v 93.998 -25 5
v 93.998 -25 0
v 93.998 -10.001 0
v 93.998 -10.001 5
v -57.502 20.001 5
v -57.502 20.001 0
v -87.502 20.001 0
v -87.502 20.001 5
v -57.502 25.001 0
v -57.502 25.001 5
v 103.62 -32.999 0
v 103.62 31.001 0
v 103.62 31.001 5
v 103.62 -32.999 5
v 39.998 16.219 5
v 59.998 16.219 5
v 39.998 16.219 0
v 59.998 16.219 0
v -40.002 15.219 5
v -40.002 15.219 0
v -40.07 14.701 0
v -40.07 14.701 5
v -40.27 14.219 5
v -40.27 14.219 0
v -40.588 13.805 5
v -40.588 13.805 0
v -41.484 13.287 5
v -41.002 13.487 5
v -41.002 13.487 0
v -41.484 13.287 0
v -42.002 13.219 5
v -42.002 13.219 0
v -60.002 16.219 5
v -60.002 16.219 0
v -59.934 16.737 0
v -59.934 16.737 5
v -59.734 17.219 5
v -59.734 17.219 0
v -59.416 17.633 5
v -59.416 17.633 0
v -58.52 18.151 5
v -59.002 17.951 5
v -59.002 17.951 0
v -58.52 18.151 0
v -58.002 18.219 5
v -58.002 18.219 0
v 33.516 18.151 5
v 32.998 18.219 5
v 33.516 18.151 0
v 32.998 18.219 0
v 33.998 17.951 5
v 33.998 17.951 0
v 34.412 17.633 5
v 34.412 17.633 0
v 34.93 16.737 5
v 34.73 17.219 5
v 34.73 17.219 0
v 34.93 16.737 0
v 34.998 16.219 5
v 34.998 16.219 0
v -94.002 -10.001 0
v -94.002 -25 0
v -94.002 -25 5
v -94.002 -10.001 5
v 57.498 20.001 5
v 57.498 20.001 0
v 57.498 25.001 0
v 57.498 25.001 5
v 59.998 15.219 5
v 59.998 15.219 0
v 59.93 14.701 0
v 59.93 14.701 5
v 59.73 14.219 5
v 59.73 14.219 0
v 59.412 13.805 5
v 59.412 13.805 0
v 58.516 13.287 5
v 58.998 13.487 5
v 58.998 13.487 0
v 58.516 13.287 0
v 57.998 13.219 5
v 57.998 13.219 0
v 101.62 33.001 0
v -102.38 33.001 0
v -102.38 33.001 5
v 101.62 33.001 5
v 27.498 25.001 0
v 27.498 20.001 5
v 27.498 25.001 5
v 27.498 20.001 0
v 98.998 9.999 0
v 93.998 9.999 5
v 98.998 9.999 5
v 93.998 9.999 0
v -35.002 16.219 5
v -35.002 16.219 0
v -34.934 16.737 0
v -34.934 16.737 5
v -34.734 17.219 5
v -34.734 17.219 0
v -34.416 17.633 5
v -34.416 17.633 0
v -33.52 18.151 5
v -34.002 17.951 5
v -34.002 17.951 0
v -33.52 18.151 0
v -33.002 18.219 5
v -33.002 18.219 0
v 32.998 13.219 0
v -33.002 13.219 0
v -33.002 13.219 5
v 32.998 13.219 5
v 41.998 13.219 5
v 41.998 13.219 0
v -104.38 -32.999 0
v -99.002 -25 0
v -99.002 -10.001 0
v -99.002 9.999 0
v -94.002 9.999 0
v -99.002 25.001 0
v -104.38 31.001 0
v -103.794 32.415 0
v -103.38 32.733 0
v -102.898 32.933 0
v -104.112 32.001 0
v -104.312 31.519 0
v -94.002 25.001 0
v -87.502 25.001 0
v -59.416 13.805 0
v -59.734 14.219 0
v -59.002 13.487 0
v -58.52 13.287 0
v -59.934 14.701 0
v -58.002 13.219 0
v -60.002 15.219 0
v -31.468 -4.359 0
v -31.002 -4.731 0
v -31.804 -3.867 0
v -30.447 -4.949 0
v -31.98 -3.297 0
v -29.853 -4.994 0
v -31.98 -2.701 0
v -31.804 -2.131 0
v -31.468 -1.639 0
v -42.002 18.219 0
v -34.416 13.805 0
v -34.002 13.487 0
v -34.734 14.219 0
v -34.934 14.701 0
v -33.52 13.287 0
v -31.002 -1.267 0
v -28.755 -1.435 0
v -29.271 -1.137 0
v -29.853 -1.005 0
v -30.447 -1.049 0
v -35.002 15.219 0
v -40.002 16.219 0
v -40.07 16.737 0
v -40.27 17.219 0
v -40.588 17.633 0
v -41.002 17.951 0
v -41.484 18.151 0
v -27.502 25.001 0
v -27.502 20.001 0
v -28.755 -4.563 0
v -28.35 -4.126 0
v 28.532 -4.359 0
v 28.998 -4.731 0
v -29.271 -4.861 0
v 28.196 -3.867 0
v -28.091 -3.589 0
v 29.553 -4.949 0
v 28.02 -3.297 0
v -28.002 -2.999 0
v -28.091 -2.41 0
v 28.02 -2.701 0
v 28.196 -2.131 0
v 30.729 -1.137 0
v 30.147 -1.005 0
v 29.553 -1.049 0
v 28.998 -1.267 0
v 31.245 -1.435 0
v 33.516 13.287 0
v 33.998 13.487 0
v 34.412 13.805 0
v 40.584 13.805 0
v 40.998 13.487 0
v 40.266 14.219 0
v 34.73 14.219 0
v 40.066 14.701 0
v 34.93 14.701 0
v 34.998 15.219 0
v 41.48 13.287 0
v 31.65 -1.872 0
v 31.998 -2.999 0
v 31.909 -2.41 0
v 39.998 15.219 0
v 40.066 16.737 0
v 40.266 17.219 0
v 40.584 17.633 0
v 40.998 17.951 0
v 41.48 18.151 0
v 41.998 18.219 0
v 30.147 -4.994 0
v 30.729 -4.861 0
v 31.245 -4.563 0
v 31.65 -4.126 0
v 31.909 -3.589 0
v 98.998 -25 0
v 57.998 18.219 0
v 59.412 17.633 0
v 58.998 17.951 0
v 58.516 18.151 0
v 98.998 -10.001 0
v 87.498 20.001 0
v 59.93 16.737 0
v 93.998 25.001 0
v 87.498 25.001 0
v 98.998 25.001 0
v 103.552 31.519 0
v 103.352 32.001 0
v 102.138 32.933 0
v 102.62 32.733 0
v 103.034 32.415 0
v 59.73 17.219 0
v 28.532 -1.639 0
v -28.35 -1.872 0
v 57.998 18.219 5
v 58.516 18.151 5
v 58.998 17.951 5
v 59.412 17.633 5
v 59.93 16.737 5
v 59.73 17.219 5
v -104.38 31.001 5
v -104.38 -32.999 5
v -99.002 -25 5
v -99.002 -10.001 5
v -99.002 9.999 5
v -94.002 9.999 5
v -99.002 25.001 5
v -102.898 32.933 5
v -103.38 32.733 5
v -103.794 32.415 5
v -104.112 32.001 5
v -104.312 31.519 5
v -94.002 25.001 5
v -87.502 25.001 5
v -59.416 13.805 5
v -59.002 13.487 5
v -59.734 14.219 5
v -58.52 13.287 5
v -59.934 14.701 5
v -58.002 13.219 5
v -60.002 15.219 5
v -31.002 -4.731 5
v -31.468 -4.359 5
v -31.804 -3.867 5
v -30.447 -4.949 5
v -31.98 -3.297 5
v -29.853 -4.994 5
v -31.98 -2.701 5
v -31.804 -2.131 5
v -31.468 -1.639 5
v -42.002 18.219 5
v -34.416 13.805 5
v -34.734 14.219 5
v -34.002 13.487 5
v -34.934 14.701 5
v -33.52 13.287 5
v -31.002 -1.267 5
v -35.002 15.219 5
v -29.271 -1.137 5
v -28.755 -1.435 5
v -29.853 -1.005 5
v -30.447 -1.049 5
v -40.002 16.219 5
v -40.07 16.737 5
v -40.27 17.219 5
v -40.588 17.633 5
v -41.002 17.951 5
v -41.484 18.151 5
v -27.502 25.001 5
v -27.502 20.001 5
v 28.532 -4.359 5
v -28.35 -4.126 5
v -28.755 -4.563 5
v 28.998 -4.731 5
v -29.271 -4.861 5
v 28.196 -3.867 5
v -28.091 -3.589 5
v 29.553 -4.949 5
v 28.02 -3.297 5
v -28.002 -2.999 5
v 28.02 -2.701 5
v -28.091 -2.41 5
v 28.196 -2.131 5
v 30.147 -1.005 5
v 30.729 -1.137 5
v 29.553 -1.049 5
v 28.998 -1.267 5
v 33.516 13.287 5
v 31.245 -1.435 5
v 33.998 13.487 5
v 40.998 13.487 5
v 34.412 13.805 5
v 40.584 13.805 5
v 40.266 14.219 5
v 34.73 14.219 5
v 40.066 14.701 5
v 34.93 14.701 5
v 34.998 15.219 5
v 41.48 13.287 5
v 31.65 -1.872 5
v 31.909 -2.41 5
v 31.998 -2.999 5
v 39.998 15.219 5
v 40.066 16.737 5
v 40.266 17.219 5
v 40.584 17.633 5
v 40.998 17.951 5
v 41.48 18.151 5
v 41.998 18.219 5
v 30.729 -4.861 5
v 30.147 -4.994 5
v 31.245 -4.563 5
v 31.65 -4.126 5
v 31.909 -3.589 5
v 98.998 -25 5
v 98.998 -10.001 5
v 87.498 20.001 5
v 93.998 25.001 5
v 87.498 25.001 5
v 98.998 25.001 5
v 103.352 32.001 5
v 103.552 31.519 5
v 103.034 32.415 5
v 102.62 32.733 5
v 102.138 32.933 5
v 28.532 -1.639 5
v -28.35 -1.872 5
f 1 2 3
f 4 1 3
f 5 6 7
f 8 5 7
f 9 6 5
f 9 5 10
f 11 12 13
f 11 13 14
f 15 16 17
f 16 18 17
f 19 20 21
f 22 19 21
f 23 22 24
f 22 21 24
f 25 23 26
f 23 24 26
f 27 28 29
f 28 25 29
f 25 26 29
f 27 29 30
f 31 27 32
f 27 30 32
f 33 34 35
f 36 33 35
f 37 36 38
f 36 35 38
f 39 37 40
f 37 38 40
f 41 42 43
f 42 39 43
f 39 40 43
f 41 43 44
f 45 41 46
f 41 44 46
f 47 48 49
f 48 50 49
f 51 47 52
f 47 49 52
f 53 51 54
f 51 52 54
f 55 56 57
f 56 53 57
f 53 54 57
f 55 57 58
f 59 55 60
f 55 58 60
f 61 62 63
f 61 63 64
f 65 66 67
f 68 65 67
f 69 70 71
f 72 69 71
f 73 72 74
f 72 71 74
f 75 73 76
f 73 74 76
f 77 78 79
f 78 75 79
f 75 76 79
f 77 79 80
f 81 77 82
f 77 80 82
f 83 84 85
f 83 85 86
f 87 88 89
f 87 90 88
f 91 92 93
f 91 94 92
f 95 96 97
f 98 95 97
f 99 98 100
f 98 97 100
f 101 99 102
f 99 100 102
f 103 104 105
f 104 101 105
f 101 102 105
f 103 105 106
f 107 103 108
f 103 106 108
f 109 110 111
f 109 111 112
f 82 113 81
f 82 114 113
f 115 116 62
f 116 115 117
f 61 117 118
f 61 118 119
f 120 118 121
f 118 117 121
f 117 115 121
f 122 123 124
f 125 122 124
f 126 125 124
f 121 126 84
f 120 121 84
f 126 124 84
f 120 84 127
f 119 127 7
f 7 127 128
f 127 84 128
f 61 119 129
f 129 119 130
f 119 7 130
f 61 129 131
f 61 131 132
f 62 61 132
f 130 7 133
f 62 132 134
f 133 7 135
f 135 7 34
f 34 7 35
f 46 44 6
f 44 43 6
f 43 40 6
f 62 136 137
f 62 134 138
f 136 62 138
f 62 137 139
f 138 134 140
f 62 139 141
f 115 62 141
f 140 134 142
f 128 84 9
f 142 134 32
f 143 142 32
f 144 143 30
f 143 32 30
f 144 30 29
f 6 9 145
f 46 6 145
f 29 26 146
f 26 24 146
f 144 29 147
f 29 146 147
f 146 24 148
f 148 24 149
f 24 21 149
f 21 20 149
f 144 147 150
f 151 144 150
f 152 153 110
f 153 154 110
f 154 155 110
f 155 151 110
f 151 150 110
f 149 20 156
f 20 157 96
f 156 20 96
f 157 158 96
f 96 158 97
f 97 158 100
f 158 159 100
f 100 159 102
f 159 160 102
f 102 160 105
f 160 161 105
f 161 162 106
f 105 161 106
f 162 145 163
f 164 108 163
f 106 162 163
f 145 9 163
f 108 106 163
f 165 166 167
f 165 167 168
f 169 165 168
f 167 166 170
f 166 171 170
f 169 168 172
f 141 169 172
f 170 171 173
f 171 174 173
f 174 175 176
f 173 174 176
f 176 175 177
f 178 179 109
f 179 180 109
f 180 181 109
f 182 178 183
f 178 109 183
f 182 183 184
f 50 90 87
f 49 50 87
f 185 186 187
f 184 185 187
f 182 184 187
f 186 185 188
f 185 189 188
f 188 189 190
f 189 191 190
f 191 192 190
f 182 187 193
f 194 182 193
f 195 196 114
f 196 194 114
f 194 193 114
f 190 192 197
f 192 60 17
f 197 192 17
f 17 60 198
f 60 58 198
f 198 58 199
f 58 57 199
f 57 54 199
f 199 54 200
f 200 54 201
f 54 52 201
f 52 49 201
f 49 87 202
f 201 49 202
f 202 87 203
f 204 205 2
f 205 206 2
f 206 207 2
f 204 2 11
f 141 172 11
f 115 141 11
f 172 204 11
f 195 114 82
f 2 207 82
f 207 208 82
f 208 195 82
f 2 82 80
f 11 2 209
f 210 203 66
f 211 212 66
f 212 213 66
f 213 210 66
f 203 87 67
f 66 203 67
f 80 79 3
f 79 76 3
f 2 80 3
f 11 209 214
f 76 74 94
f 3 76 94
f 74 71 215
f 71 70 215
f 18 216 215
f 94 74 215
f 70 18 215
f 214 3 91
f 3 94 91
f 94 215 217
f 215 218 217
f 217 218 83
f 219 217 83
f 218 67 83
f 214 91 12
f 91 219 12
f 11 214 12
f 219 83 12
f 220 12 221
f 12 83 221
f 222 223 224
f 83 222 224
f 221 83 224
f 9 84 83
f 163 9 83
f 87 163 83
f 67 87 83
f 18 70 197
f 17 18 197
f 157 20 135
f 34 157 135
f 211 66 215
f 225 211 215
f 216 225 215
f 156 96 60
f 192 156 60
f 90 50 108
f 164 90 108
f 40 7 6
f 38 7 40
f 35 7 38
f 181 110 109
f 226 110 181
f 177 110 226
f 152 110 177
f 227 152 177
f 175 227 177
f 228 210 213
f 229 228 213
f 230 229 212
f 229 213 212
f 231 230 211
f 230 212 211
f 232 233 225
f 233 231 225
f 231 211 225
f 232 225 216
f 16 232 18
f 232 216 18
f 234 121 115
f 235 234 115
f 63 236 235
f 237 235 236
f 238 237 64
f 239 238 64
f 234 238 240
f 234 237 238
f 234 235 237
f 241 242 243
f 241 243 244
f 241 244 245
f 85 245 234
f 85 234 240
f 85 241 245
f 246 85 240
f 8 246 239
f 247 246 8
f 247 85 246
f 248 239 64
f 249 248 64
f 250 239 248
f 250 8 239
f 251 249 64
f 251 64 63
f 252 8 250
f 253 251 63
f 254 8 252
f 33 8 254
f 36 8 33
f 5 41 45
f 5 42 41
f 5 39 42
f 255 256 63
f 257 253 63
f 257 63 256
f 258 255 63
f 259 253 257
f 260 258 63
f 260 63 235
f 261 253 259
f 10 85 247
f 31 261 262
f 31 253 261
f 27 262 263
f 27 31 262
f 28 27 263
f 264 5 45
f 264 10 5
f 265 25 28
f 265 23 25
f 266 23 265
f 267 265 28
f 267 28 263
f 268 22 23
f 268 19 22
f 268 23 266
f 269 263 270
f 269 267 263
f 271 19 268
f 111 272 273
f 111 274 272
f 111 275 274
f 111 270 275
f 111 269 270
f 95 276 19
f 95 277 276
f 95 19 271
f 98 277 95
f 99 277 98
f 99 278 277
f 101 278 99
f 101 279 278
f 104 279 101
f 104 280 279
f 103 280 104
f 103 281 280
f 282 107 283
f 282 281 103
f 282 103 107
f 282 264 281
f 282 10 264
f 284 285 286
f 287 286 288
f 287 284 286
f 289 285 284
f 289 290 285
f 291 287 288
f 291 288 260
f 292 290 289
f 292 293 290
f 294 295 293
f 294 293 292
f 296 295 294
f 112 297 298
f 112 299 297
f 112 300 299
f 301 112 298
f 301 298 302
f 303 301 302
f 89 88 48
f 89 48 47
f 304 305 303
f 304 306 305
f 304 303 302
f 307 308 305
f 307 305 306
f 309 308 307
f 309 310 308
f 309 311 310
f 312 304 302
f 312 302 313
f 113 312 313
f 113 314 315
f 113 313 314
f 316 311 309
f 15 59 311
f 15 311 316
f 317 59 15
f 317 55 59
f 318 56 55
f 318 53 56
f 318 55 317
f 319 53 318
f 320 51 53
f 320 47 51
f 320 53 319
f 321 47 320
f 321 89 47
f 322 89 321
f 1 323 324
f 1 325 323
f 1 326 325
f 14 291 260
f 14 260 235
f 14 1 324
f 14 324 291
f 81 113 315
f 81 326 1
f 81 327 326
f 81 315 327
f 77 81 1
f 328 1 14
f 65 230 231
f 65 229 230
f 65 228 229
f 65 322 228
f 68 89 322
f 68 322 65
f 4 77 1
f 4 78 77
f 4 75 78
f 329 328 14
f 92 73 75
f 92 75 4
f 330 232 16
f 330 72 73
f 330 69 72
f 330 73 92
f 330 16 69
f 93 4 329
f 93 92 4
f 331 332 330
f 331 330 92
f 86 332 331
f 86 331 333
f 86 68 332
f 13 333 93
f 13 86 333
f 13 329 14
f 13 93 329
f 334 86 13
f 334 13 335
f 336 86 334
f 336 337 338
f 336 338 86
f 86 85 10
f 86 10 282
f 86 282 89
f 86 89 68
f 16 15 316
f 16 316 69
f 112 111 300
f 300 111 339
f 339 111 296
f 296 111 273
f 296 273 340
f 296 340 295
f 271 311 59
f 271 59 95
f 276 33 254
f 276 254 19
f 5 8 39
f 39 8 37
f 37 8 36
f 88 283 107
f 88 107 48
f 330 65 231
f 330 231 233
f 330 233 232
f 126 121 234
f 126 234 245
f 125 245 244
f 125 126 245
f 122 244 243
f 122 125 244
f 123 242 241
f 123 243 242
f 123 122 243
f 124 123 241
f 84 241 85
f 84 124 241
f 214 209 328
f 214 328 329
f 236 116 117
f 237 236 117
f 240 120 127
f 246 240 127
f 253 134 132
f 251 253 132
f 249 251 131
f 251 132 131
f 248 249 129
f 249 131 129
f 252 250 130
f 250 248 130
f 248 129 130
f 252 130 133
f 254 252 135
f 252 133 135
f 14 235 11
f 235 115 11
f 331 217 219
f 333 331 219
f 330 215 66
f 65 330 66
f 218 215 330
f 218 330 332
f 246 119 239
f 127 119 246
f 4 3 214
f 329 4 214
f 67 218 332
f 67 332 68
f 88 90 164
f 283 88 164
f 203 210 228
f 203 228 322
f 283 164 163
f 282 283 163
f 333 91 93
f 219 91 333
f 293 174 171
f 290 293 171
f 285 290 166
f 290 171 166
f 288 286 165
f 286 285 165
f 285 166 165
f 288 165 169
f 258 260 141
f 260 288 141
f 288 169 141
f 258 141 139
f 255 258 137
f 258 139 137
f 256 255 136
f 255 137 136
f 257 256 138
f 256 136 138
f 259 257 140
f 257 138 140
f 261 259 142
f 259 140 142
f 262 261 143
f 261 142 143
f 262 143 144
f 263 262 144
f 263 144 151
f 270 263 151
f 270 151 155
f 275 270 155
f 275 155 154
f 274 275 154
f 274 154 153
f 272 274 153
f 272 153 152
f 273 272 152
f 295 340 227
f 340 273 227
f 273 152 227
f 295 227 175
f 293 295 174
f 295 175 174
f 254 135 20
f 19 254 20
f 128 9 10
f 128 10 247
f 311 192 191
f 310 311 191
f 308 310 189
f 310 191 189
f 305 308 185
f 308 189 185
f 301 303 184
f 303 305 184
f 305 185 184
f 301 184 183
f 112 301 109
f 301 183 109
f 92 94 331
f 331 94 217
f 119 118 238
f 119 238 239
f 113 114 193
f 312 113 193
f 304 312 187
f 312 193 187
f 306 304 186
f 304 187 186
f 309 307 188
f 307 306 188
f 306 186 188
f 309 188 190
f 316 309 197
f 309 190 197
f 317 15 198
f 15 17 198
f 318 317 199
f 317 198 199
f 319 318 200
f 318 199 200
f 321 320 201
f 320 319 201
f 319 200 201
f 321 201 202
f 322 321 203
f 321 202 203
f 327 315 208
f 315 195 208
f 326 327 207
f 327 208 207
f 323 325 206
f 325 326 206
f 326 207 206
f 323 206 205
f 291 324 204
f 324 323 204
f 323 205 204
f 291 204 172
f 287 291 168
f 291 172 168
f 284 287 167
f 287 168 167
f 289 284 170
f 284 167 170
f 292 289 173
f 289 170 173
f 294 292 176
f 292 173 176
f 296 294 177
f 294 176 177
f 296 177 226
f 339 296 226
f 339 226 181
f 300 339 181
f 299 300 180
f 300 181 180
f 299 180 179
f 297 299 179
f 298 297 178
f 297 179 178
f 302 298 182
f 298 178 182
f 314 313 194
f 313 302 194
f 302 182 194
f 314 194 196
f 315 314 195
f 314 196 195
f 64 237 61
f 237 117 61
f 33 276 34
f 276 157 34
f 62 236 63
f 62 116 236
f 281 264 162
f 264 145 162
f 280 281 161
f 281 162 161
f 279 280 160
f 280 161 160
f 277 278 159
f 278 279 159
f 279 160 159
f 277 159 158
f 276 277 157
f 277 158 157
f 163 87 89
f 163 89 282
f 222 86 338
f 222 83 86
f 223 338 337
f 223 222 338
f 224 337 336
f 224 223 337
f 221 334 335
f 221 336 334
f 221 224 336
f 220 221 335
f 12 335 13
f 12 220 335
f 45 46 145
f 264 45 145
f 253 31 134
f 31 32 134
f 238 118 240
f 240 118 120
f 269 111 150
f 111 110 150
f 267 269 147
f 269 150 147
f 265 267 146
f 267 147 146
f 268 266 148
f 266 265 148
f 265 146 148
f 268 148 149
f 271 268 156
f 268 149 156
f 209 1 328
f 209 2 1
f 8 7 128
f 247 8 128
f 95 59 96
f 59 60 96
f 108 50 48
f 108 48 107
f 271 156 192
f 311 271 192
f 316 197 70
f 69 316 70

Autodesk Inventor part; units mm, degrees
ref_plane "YZ Plane" through (0, 0, 0) normal (1, 0, 0) x (0, 1, 0)
ref_plane "XZ Plane" through (0, 0, 0) normal (0, 1, 0) x (-1, 0, 0)
ref_plane "XY Plane" through (0, 0, 0) normal (0, 0, 1) x (1, 0, 0)
sketch "Sketch1" plane through (0, 0, 0) normal (0, 0, 1) x (1, 0, 0)
  line L0 (-104.38, -32.9991) -> (103.62, -32.9991)
  line L1 (-102.38, 33.0009) -> (101.62, 33.0009)
  line L2 (57.998, 18.2189) -> (41.998, 18.2189)
  line L3 (41.998, 13.2189) -> (57.998, 13.2189)
  line L4 (-58.002, 18.2189) -> (-42.002, 18.2189)
  line L5 (-42.002, 13.2189) -> (-58.002, 13.2189)
  line L6 (32.998, 18.2189) -> (-33.002, 18.2189)
  line L7 (-33.002, 13.2189) -> (32.998, 13.2189)
  arc A0 (34.998, 16.2189) -> (32.998, 18.2189) centre (32.998, 16.2189) ccw
  arc A1 (-35.002, 15.2189) -> (-33.002, 13.2189) centre (-33.002, 15.2189) ccw
  arc A2 (-33.002, 18.2189) -> (-35.002, 16.2189) centre (-33.002, 16.2189) ccw
  arc A3 (-40.002, 16.2189) -> (-42.002, 18.2189) centre (-42.002, 16.2189) ccw
  arc A4 (-42.002, 13.2189) -> (-40.002, 15.2189) centre (-42.002, 15.2189) ccw
  arc A5 (-60.002, 15.2189) -> (-58.002, 13.2189) centre (-58.002, 15.2189) ccw
  arc A6 (-58.002, 18.2189) -> (-60.002, 16.2189) centre (-58.002, 16.2189) ccw
  arc A7 (39.998, 15.2189) -> (41.998, 13.2189) centre (41.998, 15.2189) ccw
  arc A8 (41.998, 18.2189) -> (39.998, 16.2189) centre (41.998, 16.2189) ccw
  arc A9 (59.998, 16.2189) -> (57.998, 18.2189) centre (57.998, 16.2189) ccw
  arc A10 (57.998, 13.2189) -> (59.998, 15.2189) centre (57.998, 15.2189) ccw
  arc A11 (32.998, 13.2189) -> (34.998, 15.2189) centre (32.998, 15.2189) ccw
  line L8 (59.998, 16.2189) -> (39.998, 16.2189)
  line L9 (39.998, 15.2189) -> (59.998, 15.2189)
  line L10 (34.998, 16.2189) -> (-35.002, 16.2189)
  line L11 (-35.002, 15.2189) -> (34.998, 15.2189)
  line L12 (-40.002, 16.2189) -> (-60.002, 16.2189)
  line L13 (-60.002, 15.2189) -> (-40.002, 15.2189)
  circle A12 centre (-30.002, -2.9991) radius 2
  circle A13 centre (29.998, -2.9991) radius 2
  line L14 (-104.38, 31.0009) -> (-104.38, -32.9991)
  line L15 (103.62, 31.0009) -> (103.62, -32.9991)
  arc A14 (-102.38, 33.0009) -> (-104.38, 31.0009) centre (-102.38, 31.0009) ccw
  arc A15 (103.62, 31.0009) -> (101.62, 33.0009) centre (101.62, 31.0009) ccw
  line L16 (93.998, -24.9998) -> (93.998, -10.0006)
  line L17 (93.998, -10.0006) -> (98.998, -10.0006)
  line L18 (98.998, -24.9998) -> (98.998, -10.0006)
  line L19 (93.998, -24.9998) -> (98.998, -24.9998)
  line L20 (93.998, 9.9994) -> (93.998, 25.0009)
  line L21 (93.998, 25.0009) -> (98.998, 25.0009)
  line L22 (98.998, 9.9994) -> (98.998, 25.0009)
  line L23 (93.998, 9.9994) -> (98.998, 9.9994)
  line L24 (87.498, 20.0009) -> (57.498, 20.0009)
  line L25 (57.498, 20.0009) -> (57.498, 25.0009)
  line L26 (87.498, 25.0009) -> (57.498, 25.0009)
  line L27 (87.498, 20.0009) -> (87.498, 25.0009)
  line L28 (27.498, 20.0009) -> (-27.502, 20.0009)
  line L29 (-27.502, 20.0009) -> (-27.502, 25.0009)
  line L30 (27.498, 25.0009) -> (-27.502, 25.0009)
  line L31 (27.498, 20.0009) -> (27.498, 25.0009)
  line L32 (-57.502, 20.0009) -> (-87.502, 20.0009)
  line L33 (-87.502, 20.0009) -> (-87.502, 25.0009)
  line L34 (-57.502, 25.0009) -> (-87.502, 25.0009)
  line L35 (-57.502, 20.0009) -> (-57.502, 25.0009)
  line L36 (-99.002, 9.9994) -> (-99.002, 25.0009)
  line L37 (-99.002, 25.0009) -> (-94.002, 25.0009)
  line L38 (-94.002, 9.9994) -> (-94.002, 25.0009)
  line L39 (-99.002, 9.9994) -> (-94.002, 9.9994)
  line L40 (-99.002, -24.9998) -> (-99.002, -10.0006)
  line L41 (-99.002, -10.0006) -> (-94.002, -10.0006)
  line L42 (-94.002, -24.9998) -> (-94.002, -10.0006)
  line L43 (-99.002, -24.9998) -> (-94.002, -24.9998)
  point P0 (59.998, 18.2189)
  point P1 (59.998, 13.2189)
  point P2 (-40.002, 15.2189)
  point P3 (-60.002, 16.2189)
  point P4 (59.998, 15.2189)
  point P5 (34.998, 15.2189)
  point P6 (-35.002, 16.2189)
  point P7 (-0.002, -3)
extrude "Extrusion1" add sketch "Sketch1" along normal blind 5
properties part number "case bottom front" material "Nylon, molybdenum disulphide"
